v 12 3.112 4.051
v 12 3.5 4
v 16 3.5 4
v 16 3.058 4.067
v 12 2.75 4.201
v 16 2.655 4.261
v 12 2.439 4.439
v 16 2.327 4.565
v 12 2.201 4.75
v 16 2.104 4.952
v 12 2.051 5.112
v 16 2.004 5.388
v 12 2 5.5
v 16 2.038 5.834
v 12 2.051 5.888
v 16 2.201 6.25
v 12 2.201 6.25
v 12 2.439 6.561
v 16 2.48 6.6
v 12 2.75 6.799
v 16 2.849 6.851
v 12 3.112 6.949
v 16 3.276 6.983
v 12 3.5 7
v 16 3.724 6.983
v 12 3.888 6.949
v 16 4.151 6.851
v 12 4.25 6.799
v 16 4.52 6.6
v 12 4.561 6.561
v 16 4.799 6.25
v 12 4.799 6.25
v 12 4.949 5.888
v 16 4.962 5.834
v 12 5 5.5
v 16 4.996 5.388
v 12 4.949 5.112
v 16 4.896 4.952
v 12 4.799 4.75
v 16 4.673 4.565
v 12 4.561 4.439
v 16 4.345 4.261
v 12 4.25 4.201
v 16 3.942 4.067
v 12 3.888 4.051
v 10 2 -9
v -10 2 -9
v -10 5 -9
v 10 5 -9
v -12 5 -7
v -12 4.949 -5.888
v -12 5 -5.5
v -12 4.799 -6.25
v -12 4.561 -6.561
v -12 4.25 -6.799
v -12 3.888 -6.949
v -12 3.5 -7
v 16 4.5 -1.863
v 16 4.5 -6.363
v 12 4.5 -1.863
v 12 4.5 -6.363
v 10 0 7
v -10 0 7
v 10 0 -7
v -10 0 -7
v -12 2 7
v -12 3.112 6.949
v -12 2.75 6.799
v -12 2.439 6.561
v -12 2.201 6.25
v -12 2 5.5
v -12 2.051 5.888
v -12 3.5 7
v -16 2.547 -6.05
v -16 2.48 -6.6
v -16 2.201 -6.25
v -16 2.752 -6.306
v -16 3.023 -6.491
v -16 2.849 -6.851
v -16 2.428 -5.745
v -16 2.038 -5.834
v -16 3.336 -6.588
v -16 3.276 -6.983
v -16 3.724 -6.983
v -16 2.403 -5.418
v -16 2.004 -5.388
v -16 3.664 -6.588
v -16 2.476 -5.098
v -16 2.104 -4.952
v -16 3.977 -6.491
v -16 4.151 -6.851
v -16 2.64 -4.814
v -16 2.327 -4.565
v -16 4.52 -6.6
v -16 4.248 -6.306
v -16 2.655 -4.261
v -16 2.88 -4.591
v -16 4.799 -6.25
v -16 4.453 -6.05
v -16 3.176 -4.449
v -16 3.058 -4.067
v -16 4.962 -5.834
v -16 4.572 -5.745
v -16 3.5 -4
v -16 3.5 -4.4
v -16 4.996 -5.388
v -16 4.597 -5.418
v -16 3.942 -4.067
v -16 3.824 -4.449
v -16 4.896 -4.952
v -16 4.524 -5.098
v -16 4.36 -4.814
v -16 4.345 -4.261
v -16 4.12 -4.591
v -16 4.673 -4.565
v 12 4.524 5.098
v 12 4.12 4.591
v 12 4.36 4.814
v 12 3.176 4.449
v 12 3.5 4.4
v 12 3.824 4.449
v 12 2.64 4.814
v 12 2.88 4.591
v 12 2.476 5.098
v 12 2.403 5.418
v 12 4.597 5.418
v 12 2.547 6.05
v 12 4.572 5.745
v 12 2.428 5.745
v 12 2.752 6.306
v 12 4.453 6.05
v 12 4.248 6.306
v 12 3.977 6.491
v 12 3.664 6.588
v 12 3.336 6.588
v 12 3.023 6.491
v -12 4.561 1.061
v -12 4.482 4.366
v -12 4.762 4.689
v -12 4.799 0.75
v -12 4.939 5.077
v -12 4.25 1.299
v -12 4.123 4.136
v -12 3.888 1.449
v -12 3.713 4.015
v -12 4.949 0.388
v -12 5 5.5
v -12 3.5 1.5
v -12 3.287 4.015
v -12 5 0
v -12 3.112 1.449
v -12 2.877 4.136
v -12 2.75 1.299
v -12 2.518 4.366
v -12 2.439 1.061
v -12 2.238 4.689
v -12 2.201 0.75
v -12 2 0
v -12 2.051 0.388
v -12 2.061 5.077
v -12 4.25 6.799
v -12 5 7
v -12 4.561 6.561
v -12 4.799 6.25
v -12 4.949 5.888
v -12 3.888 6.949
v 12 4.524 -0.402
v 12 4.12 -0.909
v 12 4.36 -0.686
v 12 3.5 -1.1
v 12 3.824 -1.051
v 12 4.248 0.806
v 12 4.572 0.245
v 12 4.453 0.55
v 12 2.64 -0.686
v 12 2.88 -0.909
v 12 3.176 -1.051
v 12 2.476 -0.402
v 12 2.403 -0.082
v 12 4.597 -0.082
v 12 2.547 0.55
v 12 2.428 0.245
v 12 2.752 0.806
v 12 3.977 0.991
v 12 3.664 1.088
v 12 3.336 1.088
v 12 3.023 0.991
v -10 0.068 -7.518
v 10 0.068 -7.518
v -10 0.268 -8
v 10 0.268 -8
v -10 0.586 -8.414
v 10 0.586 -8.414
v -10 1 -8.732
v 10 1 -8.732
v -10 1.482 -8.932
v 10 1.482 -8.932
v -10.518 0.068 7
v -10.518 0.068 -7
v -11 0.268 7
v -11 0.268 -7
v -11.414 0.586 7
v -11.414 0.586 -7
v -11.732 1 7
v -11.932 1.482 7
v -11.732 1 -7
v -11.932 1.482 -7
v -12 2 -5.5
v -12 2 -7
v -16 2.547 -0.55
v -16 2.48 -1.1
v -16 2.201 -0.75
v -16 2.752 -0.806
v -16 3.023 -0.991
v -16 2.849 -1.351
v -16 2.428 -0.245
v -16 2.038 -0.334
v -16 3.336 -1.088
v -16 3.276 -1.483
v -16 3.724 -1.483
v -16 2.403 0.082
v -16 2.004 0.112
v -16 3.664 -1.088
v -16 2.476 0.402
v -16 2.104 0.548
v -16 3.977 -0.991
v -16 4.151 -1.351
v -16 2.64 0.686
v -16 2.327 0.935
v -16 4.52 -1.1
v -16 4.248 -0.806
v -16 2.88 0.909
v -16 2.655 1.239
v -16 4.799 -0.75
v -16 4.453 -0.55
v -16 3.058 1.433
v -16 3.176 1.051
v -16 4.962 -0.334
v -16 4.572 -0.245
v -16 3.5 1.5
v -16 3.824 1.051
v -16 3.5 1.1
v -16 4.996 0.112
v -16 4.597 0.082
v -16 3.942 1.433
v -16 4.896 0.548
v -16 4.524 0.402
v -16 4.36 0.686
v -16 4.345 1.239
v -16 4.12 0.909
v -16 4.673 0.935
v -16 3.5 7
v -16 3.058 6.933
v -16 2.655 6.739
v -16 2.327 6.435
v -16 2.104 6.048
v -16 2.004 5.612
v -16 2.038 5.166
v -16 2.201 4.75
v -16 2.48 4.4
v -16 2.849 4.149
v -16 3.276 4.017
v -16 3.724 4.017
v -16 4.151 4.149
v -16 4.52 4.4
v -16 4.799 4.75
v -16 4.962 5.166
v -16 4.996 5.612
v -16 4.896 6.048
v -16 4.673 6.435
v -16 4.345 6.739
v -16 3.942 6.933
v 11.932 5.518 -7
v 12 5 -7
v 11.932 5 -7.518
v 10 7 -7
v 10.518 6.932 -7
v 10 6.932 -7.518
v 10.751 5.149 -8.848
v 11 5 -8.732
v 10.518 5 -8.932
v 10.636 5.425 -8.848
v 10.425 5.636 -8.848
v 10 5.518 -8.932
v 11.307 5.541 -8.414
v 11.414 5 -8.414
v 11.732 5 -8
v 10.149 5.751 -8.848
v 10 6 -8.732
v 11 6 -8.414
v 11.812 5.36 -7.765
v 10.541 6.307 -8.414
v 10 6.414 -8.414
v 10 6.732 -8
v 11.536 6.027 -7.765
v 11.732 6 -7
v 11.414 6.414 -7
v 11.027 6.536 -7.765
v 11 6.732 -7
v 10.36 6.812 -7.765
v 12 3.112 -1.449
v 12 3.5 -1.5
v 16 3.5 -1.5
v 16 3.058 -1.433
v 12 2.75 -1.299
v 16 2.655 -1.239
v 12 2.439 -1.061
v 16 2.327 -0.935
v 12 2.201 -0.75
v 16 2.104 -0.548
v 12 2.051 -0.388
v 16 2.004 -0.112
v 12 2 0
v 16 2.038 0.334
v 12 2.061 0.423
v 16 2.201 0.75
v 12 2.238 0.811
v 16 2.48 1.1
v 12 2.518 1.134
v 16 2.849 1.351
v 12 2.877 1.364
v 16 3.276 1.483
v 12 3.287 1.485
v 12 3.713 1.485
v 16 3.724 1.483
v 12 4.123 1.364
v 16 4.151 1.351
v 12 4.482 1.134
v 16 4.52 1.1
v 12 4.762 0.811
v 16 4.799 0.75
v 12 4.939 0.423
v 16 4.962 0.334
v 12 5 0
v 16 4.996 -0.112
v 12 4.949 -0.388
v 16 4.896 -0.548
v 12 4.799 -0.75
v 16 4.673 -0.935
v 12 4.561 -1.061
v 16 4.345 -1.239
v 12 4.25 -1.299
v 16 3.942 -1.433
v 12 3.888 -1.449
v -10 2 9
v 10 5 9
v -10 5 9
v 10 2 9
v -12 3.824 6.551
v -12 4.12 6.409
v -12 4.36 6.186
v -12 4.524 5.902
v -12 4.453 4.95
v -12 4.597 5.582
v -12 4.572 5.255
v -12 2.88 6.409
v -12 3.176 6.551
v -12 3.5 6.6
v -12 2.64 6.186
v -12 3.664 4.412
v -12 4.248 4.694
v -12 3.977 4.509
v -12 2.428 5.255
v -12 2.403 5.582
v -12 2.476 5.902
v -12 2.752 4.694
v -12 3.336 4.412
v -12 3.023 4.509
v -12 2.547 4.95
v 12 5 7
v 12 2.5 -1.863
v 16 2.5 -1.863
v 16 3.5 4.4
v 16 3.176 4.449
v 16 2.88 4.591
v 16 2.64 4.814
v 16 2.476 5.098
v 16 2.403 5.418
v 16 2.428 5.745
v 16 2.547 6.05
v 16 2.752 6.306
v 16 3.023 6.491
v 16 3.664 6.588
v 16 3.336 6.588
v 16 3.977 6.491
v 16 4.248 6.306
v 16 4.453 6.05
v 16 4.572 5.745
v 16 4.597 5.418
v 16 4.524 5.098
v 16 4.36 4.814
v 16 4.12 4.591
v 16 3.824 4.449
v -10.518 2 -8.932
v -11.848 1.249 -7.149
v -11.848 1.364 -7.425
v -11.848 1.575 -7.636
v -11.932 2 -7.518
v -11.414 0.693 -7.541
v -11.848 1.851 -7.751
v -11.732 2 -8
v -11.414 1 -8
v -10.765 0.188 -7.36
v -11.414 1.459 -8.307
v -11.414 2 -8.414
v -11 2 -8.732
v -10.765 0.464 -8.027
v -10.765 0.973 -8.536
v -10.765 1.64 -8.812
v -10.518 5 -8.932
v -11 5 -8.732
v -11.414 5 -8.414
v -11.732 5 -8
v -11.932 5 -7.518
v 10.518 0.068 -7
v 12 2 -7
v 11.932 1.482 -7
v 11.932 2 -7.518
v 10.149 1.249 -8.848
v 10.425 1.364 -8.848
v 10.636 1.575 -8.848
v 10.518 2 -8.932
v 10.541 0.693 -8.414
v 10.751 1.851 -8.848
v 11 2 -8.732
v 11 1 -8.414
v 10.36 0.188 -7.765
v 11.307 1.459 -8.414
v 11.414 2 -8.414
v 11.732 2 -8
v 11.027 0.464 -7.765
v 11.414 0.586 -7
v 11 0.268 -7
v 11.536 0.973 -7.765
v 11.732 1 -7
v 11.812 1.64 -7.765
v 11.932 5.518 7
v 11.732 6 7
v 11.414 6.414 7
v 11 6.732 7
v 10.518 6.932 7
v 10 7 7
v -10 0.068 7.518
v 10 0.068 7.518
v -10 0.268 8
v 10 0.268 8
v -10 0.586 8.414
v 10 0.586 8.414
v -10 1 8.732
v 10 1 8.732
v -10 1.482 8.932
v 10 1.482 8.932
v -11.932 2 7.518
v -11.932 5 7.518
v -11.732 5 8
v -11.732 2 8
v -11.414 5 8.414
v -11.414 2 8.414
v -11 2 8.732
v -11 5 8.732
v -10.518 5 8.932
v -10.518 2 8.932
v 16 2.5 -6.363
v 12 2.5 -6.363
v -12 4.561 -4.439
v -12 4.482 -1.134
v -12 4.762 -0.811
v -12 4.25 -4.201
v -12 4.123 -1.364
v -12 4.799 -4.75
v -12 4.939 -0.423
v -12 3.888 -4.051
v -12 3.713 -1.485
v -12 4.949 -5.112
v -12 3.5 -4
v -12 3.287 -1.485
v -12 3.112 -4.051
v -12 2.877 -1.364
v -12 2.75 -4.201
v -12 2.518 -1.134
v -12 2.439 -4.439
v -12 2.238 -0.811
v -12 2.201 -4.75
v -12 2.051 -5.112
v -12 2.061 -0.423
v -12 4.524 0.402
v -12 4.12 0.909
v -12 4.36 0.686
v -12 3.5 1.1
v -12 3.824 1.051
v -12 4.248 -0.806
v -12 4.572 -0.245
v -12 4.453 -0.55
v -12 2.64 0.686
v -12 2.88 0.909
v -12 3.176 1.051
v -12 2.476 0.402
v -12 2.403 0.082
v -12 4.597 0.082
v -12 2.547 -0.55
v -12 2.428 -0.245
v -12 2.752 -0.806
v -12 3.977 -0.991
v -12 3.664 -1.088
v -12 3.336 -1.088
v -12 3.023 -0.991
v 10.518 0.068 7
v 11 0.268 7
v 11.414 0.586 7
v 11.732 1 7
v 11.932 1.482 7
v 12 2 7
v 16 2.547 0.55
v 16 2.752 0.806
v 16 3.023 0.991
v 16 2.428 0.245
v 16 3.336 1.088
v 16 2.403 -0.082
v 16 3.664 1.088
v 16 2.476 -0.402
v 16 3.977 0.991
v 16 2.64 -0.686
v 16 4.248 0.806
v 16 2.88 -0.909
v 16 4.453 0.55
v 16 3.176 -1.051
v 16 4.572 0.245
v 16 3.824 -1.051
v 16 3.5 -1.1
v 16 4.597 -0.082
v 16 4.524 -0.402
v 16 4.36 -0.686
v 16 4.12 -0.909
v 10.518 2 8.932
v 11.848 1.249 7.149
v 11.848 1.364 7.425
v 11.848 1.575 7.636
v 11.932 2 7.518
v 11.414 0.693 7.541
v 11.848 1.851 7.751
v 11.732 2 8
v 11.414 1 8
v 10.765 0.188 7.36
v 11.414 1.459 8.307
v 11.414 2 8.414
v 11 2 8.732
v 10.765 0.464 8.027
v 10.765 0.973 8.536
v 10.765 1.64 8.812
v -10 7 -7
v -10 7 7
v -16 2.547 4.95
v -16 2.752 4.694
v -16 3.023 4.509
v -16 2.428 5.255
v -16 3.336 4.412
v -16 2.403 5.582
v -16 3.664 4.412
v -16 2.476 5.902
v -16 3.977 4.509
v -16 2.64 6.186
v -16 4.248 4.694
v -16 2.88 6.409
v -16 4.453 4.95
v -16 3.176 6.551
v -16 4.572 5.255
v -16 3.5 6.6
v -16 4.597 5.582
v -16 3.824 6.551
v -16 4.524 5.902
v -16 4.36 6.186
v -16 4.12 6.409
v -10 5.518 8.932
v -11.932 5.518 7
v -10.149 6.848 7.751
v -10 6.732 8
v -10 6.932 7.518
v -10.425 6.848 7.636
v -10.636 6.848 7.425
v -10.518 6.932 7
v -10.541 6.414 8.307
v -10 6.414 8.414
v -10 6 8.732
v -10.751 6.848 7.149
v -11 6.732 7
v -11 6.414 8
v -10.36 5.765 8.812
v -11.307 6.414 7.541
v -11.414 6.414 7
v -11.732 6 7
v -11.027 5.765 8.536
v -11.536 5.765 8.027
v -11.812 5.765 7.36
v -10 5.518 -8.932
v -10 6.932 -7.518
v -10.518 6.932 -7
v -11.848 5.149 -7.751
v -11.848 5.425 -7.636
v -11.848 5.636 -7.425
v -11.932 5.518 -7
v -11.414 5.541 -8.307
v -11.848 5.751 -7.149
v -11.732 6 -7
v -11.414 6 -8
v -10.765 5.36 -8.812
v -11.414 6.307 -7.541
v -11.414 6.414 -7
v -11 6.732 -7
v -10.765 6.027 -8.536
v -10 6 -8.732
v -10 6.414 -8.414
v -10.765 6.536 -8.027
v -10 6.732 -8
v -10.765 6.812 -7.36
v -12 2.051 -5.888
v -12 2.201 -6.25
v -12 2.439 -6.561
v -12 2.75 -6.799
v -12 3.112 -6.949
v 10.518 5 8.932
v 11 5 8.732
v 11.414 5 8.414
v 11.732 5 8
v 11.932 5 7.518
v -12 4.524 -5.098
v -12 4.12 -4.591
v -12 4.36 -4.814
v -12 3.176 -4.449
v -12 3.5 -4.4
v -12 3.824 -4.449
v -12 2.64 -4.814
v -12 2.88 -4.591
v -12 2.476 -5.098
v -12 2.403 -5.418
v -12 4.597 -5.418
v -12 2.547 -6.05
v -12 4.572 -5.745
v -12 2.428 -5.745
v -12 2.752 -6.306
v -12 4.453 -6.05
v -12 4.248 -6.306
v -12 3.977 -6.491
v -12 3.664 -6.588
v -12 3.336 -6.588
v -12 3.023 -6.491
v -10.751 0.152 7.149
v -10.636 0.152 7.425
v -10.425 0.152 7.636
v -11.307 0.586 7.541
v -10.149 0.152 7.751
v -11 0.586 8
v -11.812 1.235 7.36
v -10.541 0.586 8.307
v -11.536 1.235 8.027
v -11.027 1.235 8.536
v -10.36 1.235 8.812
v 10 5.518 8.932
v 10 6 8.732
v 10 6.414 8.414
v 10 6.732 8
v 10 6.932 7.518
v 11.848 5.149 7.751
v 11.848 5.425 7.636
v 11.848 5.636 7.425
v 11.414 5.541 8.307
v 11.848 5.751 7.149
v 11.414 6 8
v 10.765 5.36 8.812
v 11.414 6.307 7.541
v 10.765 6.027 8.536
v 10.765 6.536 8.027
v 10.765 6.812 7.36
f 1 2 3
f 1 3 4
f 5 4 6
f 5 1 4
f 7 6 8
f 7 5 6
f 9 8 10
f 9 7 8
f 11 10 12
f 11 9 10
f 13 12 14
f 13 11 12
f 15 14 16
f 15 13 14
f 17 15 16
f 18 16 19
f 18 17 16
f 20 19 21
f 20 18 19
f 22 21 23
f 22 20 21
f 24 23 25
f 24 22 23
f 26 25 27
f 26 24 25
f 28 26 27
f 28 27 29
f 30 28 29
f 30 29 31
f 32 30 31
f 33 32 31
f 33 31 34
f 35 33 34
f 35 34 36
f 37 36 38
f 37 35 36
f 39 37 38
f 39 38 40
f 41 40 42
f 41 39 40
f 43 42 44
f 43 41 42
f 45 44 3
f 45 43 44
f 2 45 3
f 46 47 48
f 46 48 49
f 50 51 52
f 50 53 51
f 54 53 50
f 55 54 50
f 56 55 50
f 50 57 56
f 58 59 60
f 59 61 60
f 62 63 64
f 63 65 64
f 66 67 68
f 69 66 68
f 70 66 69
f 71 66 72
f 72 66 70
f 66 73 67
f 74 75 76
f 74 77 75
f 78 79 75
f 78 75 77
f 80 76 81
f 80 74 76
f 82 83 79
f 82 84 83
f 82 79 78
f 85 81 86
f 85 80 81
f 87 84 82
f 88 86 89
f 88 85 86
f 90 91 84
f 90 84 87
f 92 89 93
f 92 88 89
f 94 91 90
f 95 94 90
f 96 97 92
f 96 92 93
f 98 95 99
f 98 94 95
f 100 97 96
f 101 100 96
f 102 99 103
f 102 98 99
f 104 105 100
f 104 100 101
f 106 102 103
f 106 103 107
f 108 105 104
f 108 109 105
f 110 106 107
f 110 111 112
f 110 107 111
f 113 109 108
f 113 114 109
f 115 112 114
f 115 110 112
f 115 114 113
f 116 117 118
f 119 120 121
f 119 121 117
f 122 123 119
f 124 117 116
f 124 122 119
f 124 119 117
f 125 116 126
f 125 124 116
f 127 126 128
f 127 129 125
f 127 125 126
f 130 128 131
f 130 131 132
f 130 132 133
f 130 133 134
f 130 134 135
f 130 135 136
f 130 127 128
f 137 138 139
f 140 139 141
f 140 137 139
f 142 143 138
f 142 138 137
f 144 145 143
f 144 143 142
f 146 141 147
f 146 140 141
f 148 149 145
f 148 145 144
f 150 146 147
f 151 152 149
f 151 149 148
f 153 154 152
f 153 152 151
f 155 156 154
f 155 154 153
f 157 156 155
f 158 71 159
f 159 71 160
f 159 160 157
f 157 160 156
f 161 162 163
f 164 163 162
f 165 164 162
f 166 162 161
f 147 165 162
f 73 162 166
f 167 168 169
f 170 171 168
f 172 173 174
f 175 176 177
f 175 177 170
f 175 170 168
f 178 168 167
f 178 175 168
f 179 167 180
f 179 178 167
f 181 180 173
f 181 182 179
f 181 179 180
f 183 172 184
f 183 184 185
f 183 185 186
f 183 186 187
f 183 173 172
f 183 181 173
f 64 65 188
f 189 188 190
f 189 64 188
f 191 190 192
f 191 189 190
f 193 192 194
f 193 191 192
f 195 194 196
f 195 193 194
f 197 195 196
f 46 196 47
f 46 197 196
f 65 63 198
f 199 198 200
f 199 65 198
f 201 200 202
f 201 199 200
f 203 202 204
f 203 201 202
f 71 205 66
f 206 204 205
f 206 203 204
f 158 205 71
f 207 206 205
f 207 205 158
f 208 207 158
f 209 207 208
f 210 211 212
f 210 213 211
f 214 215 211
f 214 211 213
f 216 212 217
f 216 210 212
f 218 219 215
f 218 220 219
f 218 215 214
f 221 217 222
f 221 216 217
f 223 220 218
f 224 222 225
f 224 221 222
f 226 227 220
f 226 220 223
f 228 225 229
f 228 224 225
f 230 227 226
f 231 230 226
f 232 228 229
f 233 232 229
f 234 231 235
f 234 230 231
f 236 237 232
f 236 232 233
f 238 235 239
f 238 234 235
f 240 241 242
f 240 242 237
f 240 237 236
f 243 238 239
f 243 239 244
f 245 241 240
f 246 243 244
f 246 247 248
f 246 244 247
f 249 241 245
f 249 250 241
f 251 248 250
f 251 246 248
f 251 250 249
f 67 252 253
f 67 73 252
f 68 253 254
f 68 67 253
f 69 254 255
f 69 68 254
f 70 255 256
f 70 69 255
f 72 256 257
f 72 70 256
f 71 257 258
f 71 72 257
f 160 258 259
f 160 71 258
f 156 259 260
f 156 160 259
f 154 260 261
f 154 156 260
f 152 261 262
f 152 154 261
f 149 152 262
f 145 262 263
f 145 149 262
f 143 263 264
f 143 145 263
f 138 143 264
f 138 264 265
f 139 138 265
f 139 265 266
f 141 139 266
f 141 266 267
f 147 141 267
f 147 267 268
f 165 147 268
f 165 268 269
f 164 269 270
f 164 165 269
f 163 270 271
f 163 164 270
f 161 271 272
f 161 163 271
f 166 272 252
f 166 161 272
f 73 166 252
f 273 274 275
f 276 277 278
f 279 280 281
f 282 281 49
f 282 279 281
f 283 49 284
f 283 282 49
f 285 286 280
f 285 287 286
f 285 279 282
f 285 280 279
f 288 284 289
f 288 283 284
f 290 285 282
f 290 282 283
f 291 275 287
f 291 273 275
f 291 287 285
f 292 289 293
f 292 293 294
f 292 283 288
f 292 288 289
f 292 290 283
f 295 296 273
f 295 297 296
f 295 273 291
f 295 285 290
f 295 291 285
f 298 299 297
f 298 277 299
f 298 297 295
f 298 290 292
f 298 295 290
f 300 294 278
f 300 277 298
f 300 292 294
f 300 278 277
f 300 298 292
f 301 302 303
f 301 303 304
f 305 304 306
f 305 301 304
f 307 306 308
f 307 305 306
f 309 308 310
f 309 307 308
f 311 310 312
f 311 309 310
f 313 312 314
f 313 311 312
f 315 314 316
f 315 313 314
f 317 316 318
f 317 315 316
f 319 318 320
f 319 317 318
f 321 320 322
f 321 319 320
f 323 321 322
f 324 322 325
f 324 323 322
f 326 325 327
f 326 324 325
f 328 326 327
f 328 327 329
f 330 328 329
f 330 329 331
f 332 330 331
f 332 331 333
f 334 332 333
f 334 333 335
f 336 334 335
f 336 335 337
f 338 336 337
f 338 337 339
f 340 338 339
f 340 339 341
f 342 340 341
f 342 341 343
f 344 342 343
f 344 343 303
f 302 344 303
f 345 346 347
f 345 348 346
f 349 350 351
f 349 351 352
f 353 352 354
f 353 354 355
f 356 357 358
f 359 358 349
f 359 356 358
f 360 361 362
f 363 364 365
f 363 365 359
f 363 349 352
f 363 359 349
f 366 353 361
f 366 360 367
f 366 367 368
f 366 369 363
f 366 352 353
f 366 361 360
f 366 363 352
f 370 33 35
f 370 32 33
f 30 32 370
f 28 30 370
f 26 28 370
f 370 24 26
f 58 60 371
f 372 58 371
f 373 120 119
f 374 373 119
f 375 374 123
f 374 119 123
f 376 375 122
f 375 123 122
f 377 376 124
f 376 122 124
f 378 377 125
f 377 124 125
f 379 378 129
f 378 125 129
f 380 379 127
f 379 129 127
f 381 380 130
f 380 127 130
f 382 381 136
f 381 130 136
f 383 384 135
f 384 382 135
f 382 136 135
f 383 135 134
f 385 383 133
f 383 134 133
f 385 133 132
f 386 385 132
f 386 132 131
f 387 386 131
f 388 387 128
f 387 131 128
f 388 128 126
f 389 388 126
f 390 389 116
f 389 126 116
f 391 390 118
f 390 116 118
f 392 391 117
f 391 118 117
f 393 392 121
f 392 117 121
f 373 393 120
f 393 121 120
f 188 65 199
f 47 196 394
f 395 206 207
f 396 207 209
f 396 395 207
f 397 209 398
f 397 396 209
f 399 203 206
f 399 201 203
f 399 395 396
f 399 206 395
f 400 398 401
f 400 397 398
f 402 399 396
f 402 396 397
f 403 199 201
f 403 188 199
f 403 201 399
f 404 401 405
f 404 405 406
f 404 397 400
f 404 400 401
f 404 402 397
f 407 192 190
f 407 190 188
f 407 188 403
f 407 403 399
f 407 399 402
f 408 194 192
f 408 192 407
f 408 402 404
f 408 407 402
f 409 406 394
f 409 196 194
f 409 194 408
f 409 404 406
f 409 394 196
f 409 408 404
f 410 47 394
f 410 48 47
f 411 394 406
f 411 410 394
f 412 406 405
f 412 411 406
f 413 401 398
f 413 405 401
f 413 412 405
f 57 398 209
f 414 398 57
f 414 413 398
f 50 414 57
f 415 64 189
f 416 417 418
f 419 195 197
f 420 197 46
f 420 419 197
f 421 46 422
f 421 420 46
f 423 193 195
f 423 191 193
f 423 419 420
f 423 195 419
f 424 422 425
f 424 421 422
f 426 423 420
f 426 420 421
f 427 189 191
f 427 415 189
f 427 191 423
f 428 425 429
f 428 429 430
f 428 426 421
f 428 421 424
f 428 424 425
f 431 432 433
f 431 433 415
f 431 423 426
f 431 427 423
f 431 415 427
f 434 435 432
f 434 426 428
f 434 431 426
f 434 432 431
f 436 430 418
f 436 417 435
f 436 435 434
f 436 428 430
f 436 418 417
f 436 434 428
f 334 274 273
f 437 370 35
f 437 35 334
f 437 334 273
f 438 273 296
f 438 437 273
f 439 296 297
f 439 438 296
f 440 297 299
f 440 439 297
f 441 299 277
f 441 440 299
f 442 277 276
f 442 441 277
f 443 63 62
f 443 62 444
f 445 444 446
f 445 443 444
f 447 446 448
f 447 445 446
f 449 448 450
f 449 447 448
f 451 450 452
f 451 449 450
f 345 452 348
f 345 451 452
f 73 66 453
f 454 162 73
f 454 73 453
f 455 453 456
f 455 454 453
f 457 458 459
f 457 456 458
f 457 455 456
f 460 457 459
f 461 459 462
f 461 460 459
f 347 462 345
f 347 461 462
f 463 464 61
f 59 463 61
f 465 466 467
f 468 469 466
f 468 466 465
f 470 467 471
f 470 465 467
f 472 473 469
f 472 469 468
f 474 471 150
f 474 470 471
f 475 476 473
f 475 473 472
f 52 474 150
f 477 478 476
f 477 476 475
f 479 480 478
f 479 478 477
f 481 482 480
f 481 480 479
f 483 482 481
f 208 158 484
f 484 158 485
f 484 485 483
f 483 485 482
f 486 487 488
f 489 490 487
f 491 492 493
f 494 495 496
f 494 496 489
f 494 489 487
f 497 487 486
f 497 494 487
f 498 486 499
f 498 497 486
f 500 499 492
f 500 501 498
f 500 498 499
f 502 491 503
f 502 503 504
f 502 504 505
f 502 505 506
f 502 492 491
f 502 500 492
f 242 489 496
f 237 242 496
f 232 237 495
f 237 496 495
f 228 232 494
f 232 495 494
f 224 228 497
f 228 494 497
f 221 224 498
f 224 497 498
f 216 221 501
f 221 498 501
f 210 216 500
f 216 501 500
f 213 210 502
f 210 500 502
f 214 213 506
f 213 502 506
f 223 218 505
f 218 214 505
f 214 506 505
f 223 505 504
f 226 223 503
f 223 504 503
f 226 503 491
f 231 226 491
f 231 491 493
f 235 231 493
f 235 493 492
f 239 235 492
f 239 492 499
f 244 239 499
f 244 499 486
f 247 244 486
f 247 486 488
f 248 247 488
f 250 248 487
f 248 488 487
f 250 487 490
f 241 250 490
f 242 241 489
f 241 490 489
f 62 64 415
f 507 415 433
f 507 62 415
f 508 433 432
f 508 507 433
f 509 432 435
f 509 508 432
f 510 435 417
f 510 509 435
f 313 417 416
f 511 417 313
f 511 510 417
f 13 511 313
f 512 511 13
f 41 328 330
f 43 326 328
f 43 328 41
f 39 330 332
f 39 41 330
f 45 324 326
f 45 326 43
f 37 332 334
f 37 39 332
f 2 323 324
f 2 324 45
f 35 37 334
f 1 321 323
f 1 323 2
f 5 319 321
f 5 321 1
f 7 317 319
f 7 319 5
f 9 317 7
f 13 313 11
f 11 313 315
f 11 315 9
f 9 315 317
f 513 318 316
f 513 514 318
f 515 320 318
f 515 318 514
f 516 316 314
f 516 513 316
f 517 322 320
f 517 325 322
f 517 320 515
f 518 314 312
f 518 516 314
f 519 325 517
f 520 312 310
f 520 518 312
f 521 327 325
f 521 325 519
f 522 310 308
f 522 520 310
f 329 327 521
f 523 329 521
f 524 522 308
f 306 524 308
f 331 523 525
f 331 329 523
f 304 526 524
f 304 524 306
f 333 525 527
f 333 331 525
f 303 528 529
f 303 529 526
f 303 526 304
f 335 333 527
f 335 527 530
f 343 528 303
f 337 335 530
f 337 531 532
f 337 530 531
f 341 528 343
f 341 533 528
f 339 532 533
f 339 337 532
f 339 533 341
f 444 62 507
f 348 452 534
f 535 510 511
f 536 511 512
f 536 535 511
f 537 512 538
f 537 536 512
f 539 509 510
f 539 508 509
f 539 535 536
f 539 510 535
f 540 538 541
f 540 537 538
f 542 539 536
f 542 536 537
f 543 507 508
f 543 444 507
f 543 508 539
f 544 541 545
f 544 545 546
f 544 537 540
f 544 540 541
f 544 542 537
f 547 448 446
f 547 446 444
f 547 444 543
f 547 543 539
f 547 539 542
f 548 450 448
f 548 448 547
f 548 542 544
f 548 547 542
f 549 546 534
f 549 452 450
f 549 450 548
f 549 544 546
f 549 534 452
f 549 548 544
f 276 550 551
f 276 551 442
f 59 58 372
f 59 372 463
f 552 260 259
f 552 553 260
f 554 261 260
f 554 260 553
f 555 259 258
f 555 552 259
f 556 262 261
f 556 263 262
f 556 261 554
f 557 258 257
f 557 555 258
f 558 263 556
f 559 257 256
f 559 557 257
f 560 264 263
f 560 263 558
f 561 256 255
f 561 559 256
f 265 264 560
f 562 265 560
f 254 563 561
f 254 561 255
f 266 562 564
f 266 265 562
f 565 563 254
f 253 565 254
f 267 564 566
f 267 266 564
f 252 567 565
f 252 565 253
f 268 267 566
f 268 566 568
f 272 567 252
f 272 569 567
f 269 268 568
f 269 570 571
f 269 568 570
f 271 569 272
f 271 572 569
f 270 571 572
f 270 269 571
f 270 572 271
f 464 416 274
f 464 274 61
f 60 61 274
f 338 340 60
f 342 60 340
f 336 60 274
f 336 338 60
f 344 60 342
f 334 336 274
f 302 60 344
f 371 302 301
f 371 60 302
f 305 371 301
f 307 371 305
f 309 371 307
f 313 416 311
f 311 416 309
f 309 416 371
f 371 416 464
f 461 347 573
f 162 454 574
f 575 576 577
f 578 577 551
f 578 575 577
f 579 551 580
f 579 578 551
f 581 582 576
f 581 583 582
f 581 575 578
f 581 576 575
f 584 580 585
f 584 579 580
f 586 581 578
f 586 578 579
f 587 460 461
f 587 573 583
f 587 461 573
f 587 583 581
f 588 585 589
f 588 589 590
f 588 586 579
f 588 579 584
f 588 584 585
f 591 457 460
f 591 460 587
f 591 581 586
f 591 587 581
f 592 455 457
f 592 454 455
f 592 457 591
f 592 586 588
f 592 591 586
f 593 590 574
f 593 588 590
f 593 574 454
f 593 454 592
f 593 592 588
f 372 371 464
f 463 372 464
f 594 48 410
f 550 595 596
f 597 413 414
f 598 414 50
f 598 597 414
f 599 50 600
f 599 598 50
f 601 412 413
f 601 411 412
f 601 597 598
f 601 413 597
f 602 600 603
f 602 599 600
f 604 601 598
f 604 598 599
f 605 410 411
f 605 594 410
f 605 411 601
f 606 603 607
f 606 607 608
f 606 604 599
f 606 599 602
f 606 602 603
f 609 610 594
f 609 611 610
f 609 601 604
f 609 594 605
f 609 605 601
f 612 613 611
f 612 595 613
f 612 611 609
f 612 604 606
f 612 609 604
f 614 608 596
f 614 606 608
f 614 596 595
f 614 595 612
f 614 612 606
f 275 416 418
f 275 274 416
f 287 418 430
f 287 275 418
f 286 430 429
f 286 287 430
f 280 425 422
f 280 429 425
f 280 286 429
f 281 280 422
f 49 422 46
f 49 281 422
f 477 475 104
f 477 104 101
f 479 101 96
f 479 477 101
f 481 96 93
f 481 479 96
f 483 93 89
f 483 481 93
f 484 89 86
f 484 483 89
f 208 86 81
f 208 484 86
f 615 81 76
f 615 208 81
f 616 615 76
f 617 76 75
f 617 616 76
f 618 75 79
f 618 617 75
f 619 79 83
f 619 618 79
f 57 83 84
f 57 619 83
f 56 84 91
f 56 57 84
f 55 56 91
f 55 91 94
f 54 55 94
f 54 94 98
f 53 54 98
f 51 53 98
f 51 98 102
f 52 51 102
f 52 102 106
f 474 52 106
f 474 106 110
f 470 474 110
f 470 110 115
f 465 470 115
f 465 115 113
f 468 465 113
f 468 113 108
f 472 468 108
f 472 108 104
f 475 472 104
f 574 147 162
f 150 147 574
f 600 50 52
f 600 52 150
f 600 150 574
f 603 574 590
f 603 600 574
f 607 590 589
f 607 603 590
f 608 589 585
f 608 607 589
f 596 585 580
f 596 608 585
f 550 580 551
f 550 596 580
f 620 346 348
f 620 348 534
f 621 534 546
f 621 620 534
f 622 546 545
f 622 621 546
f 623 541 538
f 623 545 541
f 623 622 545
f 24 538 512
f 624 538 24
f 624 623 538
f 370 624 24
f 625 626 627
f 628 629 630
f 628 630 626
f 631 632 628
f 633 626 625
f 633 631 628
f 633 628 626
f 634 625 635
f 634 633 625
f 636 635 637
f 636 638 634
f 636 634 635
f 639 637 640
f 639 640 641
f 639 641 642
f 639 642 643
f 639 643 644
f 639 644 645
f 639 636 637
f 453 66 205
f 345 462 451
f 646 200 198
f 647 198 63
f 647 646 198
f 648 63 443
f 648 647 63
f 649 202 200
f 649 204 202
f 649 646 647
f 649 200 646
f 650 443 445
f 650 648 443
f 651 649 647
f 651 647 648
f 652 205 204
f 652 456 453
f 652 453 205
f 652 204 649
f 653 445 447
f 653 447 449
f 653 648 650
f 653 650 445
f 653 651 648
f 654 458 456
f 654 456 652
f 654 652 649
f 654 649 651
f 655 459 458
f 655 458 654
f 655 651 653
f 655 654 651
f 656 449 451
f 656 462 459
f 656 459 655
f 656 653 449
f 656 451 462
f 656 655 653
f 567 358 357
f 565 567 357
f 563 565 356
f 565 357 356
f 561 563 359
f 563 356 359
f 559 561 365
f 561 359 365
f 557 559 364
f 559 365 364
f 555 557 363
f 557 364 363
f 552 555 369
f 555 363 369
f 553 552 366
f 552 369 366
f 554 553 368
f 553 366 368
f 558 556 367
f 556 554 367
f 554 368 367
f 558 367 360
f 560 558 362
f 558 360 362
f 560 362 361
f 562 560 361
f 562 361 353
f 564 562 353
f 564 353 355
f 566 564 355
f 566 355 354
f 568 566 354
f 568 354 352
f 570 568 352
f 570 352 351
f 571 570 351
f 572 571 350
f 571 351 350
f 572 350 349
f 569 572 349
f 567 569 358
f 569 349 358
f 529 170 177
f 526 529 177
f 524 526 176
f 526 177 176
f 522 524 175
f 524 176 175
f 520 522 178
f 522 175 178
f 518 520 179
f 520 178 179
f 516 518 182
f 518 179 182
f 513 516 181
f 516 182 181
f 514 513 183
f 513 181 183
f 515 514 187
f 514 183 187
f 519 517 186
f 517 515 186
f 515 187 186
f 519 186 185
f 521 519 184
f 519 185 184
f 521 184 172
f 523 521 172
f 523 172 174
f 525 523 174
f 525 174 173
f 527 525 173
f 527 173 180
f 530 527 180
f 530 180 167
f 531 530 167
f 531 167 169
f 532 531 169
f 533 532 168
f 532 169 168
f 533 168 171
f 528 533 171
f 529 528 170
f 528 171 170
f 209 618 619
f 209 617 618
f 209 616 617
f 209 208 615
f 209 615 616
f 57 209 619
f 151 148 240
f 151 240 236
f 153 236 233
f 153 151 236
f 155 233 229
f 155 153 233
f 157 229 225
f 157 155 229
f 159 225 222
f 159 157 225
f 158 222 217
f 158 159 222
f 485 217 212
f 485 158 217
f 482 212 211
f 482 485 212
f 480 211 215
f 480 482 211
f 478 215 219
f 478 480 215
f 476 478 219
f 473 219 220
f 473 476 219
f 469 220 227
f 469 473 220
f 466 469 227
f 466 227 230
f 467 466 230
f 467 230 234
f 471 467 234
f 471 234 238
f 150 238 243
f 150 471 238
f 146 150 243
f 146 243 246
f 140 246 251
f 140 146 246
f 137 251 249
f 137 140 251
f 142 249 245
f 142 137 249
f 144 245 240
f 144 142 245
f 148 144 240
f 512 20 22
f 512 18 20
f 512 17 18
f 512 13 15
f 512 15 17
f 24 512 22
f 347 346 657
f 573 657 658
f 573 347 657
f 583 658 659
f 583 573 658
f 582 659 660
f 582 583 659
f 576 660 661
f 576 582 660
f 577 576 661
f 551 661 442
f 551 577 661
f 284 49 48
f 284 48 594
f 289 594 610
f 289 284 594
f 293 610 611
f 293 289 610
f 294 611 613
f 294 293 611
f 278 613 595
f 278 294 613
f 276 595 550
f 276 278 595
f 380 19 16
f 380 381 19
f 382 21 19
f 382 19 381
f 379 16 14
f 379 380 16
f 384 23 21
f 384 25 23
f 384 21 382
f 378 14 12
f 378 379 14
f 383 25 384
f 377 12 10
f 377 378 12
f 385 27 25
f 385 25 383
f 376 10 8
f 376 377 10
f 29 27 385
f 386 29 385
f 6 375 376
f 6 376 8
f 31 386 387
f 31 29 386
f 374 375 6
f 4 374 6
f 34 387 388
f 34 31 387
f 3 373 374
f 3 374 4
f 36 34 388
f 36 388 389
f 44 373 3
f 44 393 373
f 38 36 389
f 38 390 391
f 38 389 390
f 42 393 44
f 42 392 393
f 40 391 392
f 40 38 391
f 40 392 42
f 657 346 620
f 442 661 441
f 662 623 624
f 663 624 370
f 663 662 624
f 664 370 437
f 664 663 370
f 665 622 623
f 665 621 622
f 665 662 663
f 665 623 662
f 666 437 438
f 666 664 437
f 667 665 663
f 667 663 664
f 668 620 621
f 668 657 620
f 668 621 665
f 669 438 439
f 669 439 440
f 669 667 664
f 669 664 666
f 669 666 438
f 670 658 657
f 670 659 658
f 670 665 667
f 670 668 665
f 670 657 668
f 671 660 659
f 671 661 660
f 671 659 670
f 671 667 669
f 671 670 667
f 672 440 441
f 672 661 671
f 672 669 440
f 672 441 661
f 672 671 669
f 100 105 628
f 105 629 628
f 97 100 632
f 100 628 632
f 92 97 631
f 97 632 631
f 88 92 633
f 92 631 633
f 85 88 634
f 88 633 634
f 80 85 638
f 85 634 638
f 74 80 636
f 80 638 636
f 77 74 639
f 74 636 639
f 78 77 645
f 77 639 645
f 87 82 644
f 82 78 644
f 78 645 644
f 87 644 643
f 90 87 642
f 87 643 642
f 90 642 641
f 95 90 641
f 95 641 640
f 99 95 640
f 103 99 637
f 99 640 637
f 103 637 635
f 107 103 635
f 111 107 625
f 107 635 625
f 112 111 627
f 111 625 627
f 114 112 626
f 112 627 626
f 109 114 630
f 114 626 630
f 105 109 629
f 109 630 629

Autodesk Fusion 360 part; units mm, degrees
sketch "Sketch1" plane through (0, 0, 0) normal (0, 1, 0) x (1, 0, 0)
  line L0 (12, -9) -> (-12, -9)
  line L1 (-12, -9) -> (-12, 9)
  line L2 (-12, 9) -> (12, 9)
  line L3 (12, 9) -> (12, -9)
  line L4 (12, -9) -> (-12, 9) construction
  line L5 (-12, -9) -> (12, 9) construction
  dimension "d1" = 24
  dimension "d2" = 18
extrude "Extrude1" add sketch "Sketch1" along normal blind 7
fillet "Fillet1" radius 2 12 edges at (-12, 3.5, 9) (0, 7, 9) (0, 0, 9) (12, 3.5, 9) (12, 7, 0) (12, 0, 0) (12, 3.5, -9) (0, 7, -9) (0, 0, -9) (-12, 3.5, -9) (-12, 7, 0) (-12, 0, 0)
sketch "Sketch2" plane through (-12, 0, 0) normal (-1, 0, 0) x (0, 0, 1)
  line L0 (-7, 2) -> (7, 2)
  line L1 (7, 2) -> (7, 5)
  line L2 (7, 5) -> (-7, 5)
  line L3 (-7, 5) -> (-7, 2)
  line L4 (-7, 3.5) -> (7, 3.5) construction
  circle A0 centre (0, 3.5) radius 1.5
  circle A1 centre (0, 3.5) radius 1.1
  circle A2 centre (-5.5, 3.5) radius 1.5
  circle A3 centre (5.5, 3.5) radius 1.5
  circle A4 centre (5.5, 3.5) radius 1.1
  circle A5 centre (-5.5, 3.5) radius 1.1
  dimension "d6" = 2.2
extrude "Extrude2" add sketch "Sketch2" along normal blind 4 contours A2 | A0 | A3
sketch "Sketch3" plane through (12, 0, 0) normal (1, 0, 0) x (0, 0, -1)
  line L0 (-7, 2) -> (7, 2)
  line L1 (7, 2) -> (7, 5)
  line L2 (7, 5) -> (-7, 5)
  line L3 (-7, 5) -> (-7, 2)
  line L4 (7, 3.5) -> (-7, 3.5) construction
  line L5 (6.3632, 4.5) -> (1.8632, 4.5)
  line L6 (1.8632, 4.5) -> (1.8632, 2.5)
  line L7 (1.8632, 2.5) -> (6.3632, 2.5)
  line L8 (6.3632, 2.5) -> (6.3632, 4.5)
  line L9 (6.3632, 4.5) -> (1.8632, 2.5) construction
  line L10 (1.8632, 4.5) -> (6.3632, 2.5) construction
  circle A0 centre (-5.5, 3.5) radius 1.5
  circle A1 centre (-5.5, 3.5) radius 1.1
  circle A2 centre (0, 3.5) radius 1.5
  circle A3 centre (0, 3.5) radius 1.1
  point P0 (4.1132, 3.5)
  dimension "d10" = 4.5
  dimension "d11" = 1
  dimension "d12" = 3
  dimension "d13" = 2.2
extrude "Extrude3" add sketch "Sketch3" along normal blind 4 contours A0 | A2 | L5 L6 L7 L8
